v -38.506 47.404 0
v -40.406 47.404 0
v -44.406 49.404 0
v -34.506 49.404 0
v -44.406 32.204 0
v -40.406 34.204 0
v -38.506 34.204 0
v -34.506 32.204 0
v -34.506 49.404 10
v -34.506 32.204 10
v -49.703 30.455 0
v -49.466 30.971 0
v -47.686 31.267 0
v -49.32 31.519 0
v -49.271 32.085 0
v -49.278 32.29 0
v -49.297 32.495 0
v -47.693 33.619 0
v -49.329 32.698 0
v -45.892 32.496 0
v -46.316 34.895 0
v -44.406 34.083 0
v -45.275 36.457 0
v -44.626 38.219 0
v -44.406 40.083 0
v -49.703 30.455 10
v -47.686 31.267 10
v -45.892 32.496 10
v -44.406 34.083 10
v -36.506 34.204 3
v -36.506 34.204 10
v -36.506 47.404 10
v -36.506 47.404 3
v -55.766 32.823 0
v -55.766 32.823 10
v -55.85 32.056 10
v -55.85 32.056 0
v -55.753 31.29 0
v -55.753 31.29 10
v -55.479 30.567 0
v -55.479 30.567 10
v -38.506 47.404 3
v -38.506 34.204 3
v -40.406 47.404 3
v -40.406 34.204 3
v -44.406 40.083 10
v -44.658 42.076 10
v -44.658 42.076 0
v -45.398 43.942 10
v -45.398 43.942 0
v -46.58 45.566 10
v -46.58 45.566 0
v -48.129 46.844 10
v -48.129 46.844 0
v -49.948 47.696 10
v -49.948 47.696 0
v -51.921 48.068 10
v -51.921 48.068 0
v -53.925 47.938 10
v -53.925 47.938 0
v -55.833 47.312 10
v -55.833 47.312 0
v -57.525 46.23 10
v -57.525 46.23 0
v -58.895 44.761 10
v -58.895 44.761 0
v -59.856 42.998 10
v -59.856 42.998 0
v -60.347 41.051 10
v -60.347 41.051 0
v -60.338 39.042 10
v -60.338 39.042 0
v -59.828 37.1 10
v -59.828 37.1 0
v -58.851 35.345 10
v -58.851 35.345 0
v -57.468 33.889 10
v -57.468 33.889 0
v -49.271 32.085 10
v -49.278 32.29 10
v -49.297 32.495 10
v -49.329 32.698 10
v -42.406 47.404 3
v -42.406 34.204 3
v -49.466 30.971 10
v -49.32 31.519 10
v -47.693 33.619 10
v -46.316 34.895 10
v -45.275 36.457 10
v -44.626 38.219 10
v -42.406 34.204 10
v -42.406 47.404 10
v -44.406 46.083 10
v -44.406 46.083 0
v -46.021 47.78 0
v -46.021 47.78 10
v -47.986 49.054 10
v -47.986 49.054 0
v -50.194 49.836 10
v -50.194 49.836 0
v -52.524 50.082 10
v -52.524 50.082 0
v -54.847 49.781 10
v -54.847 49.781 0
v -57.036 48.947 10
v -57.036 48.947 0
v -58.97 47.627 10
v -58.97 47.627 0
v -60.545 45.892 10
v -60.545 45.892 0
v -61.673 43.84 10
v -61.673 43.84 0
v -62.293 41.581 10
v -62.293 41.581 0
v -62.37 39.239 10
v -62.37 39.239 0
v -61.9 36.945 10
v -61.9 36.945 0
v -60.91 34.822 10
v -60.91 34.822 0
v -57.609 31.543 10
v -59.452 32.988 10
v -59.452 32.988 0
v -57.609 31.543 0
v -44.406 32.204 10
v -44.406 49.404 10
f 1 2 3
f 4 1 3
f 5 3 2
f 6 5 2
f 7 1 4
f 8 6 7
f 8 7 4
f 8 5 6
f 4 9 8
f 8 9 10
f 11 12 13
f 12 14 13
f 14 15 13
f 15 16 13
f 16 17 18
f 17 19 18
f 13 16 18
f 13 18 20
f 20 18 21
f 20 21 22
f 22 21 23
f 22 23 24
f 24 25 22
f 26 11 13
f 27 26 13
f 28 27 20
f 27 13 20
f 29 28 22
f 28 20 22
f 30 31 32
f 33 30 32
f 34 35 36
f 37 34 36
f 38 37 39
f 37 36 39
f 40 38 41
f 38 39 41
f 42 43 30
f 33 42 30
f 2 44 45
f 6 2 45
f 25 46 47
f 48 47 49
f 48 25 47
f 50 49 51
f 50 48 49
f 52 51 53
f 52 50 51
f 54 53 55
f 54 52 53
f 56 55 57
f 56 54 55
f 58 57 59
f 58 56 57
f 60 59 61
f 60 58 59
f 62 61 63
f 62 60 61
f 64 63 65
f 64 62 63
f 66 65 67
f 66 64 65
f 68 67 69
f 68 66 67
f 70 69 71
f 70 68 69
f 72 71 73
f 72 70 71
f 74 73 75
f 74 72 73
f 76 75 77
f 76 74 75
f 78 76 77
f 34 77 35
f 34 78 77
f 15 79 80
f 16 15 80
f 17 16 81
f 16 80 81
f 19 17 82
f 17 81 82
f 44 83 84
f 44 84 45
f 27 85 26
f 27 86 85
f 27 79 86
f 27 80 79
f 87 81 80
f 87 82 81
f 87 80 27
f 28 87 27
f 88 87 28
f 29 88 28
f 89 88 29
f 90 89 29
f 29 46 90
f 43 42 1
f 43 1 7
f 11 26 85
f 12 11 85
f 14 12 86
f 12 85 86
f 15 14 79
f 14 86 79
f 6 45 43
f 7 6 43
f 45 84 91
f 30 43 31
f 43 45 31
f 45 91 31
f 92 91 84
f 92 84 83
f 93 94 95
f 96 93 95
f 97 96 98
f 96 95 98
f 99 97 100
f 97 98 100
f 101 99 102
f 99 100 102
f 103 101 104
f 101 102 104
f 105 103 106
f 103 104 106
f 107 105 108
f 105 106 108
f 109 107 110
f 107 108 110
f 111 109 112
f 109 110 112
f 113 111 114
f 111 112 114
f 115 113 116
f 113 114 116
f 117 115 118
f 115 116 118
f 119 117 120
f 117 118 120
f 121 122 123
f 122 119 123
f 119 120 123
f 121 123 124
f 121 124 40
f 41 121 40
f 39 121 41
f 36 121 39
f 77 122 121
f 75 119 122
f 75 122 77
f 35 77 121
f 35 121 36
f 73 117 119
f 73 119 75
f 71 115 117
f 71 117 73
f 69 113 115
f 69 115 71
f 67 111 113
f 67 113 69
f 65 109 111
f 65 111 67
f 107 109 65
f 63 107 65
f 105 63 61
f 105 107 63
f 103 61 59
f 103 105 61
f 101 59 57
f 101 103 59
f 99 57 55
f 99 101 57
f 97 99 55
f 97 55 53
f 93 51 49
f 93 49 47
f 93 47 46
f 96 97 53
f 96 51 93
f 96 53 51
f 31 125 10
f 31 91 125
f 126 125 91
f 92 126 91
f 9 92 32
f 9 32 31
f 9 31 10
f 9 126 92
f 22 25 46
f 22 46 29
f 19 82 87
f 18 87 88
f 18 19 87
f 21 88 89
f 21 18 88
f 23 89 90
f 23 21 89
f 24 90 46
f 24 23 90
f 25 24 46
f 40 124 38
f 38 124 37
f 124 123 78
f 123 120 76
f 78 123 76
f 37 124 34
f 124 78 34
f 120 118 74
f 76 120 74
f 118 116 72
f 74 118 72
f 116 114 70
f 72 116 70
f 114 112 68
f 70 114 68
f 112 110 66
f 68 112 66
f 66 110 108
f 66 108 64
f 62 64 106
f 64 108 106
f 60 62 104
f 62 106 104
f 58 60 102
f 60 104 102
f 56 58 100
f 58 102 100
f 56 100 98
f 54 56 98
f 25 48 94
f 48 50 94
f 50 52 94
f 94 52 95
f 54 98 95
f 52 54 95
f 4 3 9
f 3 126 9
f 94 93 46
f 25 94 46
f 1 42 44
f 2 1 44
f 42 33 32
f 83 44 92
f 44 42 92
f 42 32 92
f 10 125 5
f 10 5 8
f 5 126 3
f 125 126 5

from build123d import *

# Parameters (mm, degrees)
F0_R      = 10
F0_R_2    = 8
F1_DEPTH  = 10
F3_DEPTH  = 10.001
F5_DEPTH  = 10.001
F4_W      = 9.9
F4_H      = 17.2
F6_DEPTH  = 7
F7_W      = 5.9
F7_H      = 13.2
F8_DEPTH  = 25
F9_W      = 9.9
F9_H      = 17.2
F9_W_2    = 2
F9_H_2    = 13.2
F10_DEPTH = 3


# Not quite as in the source:
# - a feature names something its author has since deleted; it is built from what else it names


with BuildPart() as f1:
    # F0 (on Top) → F1 (new body)
    with BuildSketch(Plane.XY):
        with Locations((-52.405577153, 40.0831848383)):
            Circle(F0_R)
        with Locations((-52.405577153, 40.0831848383)):
            Circle(F0_R_2, mode=Mode.SUBTRACT)
    extrude(amount=F1_DEPTH)

    # F2 (on face) → F3 (cut, through all)
    with BuildSketch(Plane.XY.offset(10)):
        with BuildLine():
            ThreePointArc((-49.7031392182, 30.4552655818), (-49.3810314173, 31.2418399469), (-49.2712181951, 32.0846885237))
            ThreePointArc((-49.2712181951, 32.0846885237), (-49.2856908096, 32.3929169306), (-49.3289813029, 32.6984331177))
            ThreePointArc((-49.3289813029, 32.6984331177), (-52.5606793952, 32.0846885237), (-55.7661541698, 32.8232590732))
            ThreePointArc((-55.7661541698, 32.8232590732), (-55.8238565493, 31.6696826825), (-55.4792412657, 30.5672724321))
            ThreePointArc((-55.4792412657, 30.5672724321), (-52.5994549558, 30.0850644451), (-49.7031392182, 30.4552655818))
        make_face()
    extrude(amount=-F3_DEPTH, mode=Mode.SUBTRACT)

    # F4 (on face) → F5 (cut, through all)
    with BuildSketch(Plane.XY.offset(10)):
        with BuildLine():
            ThreePointArc((-44.405577153, 34.0831848383), (-42.405577153, 40.0831848383), (-44.405577153, 46.0831848383))
            Line((-44.405577153, 46.0831848383), (-44.405577153, 40.0831848383))
            Line((-44.405577153, 40.0831848383), (-44.405577153, 34.0831848383))
        make_face()
    extrude(amount=-F5_DEPTH, mode=Mode.SUBTRACT)


with BuildPart() as f6:
    # F4 (on face) → F6 (new body)
    with BuildSketch(Plane.XY.offset(10)):
        with Locations((-39.455577153, 40.8040919366)):
            Rectangle(F4_W, F4_H)
    extrude(amount=-F6_DEPTH)

    # F7 (on face) → F8 (cut)
    with BuildSketch(Plane.XY.offset(10)):
        with Locations((-39.455577153, 40.8040919366)):
            Rectangle(F7_W, F7_H)
    extrude(amount=-F8_DEPTH, mode=Mode.SUBTRACT)

    # F9 (on face) → F10 (join)
    with BuildSketch(Plane(origin=(0, 0, 3), x_dir=(1, 0, 0), z_dir=(0, 0, -1))):
        with Locations((-39.455577153, -40.8040919366)):
            Rectangle(F9_W, F9_H)
        Polygon((-42.405577153, -47.4040919366), (-42.405577153, -34.2040919366), (-40.405577153, -34.2040919366), (-38.505577153, -34.2040919366), (-36.505577153, -34.2040919366), (-36.505577153, -47.4040919366), (-38.505577153, -47.4040919366), (-40.405577153, -47.4040919366), align=None, mode=Mode.SUBTRACT)
        with Locations((-41.405577153, -40.8040919366)):
            Rectangle(F9_W_2, F9_H_2)
        with Locations((-37.505577153, -40.8040919366)):
            Rectangle(F9_W_2, F9_H_2)
    extrude(amount=F10_DEPTH)


solid = Compound([f1.part, f6.part])
